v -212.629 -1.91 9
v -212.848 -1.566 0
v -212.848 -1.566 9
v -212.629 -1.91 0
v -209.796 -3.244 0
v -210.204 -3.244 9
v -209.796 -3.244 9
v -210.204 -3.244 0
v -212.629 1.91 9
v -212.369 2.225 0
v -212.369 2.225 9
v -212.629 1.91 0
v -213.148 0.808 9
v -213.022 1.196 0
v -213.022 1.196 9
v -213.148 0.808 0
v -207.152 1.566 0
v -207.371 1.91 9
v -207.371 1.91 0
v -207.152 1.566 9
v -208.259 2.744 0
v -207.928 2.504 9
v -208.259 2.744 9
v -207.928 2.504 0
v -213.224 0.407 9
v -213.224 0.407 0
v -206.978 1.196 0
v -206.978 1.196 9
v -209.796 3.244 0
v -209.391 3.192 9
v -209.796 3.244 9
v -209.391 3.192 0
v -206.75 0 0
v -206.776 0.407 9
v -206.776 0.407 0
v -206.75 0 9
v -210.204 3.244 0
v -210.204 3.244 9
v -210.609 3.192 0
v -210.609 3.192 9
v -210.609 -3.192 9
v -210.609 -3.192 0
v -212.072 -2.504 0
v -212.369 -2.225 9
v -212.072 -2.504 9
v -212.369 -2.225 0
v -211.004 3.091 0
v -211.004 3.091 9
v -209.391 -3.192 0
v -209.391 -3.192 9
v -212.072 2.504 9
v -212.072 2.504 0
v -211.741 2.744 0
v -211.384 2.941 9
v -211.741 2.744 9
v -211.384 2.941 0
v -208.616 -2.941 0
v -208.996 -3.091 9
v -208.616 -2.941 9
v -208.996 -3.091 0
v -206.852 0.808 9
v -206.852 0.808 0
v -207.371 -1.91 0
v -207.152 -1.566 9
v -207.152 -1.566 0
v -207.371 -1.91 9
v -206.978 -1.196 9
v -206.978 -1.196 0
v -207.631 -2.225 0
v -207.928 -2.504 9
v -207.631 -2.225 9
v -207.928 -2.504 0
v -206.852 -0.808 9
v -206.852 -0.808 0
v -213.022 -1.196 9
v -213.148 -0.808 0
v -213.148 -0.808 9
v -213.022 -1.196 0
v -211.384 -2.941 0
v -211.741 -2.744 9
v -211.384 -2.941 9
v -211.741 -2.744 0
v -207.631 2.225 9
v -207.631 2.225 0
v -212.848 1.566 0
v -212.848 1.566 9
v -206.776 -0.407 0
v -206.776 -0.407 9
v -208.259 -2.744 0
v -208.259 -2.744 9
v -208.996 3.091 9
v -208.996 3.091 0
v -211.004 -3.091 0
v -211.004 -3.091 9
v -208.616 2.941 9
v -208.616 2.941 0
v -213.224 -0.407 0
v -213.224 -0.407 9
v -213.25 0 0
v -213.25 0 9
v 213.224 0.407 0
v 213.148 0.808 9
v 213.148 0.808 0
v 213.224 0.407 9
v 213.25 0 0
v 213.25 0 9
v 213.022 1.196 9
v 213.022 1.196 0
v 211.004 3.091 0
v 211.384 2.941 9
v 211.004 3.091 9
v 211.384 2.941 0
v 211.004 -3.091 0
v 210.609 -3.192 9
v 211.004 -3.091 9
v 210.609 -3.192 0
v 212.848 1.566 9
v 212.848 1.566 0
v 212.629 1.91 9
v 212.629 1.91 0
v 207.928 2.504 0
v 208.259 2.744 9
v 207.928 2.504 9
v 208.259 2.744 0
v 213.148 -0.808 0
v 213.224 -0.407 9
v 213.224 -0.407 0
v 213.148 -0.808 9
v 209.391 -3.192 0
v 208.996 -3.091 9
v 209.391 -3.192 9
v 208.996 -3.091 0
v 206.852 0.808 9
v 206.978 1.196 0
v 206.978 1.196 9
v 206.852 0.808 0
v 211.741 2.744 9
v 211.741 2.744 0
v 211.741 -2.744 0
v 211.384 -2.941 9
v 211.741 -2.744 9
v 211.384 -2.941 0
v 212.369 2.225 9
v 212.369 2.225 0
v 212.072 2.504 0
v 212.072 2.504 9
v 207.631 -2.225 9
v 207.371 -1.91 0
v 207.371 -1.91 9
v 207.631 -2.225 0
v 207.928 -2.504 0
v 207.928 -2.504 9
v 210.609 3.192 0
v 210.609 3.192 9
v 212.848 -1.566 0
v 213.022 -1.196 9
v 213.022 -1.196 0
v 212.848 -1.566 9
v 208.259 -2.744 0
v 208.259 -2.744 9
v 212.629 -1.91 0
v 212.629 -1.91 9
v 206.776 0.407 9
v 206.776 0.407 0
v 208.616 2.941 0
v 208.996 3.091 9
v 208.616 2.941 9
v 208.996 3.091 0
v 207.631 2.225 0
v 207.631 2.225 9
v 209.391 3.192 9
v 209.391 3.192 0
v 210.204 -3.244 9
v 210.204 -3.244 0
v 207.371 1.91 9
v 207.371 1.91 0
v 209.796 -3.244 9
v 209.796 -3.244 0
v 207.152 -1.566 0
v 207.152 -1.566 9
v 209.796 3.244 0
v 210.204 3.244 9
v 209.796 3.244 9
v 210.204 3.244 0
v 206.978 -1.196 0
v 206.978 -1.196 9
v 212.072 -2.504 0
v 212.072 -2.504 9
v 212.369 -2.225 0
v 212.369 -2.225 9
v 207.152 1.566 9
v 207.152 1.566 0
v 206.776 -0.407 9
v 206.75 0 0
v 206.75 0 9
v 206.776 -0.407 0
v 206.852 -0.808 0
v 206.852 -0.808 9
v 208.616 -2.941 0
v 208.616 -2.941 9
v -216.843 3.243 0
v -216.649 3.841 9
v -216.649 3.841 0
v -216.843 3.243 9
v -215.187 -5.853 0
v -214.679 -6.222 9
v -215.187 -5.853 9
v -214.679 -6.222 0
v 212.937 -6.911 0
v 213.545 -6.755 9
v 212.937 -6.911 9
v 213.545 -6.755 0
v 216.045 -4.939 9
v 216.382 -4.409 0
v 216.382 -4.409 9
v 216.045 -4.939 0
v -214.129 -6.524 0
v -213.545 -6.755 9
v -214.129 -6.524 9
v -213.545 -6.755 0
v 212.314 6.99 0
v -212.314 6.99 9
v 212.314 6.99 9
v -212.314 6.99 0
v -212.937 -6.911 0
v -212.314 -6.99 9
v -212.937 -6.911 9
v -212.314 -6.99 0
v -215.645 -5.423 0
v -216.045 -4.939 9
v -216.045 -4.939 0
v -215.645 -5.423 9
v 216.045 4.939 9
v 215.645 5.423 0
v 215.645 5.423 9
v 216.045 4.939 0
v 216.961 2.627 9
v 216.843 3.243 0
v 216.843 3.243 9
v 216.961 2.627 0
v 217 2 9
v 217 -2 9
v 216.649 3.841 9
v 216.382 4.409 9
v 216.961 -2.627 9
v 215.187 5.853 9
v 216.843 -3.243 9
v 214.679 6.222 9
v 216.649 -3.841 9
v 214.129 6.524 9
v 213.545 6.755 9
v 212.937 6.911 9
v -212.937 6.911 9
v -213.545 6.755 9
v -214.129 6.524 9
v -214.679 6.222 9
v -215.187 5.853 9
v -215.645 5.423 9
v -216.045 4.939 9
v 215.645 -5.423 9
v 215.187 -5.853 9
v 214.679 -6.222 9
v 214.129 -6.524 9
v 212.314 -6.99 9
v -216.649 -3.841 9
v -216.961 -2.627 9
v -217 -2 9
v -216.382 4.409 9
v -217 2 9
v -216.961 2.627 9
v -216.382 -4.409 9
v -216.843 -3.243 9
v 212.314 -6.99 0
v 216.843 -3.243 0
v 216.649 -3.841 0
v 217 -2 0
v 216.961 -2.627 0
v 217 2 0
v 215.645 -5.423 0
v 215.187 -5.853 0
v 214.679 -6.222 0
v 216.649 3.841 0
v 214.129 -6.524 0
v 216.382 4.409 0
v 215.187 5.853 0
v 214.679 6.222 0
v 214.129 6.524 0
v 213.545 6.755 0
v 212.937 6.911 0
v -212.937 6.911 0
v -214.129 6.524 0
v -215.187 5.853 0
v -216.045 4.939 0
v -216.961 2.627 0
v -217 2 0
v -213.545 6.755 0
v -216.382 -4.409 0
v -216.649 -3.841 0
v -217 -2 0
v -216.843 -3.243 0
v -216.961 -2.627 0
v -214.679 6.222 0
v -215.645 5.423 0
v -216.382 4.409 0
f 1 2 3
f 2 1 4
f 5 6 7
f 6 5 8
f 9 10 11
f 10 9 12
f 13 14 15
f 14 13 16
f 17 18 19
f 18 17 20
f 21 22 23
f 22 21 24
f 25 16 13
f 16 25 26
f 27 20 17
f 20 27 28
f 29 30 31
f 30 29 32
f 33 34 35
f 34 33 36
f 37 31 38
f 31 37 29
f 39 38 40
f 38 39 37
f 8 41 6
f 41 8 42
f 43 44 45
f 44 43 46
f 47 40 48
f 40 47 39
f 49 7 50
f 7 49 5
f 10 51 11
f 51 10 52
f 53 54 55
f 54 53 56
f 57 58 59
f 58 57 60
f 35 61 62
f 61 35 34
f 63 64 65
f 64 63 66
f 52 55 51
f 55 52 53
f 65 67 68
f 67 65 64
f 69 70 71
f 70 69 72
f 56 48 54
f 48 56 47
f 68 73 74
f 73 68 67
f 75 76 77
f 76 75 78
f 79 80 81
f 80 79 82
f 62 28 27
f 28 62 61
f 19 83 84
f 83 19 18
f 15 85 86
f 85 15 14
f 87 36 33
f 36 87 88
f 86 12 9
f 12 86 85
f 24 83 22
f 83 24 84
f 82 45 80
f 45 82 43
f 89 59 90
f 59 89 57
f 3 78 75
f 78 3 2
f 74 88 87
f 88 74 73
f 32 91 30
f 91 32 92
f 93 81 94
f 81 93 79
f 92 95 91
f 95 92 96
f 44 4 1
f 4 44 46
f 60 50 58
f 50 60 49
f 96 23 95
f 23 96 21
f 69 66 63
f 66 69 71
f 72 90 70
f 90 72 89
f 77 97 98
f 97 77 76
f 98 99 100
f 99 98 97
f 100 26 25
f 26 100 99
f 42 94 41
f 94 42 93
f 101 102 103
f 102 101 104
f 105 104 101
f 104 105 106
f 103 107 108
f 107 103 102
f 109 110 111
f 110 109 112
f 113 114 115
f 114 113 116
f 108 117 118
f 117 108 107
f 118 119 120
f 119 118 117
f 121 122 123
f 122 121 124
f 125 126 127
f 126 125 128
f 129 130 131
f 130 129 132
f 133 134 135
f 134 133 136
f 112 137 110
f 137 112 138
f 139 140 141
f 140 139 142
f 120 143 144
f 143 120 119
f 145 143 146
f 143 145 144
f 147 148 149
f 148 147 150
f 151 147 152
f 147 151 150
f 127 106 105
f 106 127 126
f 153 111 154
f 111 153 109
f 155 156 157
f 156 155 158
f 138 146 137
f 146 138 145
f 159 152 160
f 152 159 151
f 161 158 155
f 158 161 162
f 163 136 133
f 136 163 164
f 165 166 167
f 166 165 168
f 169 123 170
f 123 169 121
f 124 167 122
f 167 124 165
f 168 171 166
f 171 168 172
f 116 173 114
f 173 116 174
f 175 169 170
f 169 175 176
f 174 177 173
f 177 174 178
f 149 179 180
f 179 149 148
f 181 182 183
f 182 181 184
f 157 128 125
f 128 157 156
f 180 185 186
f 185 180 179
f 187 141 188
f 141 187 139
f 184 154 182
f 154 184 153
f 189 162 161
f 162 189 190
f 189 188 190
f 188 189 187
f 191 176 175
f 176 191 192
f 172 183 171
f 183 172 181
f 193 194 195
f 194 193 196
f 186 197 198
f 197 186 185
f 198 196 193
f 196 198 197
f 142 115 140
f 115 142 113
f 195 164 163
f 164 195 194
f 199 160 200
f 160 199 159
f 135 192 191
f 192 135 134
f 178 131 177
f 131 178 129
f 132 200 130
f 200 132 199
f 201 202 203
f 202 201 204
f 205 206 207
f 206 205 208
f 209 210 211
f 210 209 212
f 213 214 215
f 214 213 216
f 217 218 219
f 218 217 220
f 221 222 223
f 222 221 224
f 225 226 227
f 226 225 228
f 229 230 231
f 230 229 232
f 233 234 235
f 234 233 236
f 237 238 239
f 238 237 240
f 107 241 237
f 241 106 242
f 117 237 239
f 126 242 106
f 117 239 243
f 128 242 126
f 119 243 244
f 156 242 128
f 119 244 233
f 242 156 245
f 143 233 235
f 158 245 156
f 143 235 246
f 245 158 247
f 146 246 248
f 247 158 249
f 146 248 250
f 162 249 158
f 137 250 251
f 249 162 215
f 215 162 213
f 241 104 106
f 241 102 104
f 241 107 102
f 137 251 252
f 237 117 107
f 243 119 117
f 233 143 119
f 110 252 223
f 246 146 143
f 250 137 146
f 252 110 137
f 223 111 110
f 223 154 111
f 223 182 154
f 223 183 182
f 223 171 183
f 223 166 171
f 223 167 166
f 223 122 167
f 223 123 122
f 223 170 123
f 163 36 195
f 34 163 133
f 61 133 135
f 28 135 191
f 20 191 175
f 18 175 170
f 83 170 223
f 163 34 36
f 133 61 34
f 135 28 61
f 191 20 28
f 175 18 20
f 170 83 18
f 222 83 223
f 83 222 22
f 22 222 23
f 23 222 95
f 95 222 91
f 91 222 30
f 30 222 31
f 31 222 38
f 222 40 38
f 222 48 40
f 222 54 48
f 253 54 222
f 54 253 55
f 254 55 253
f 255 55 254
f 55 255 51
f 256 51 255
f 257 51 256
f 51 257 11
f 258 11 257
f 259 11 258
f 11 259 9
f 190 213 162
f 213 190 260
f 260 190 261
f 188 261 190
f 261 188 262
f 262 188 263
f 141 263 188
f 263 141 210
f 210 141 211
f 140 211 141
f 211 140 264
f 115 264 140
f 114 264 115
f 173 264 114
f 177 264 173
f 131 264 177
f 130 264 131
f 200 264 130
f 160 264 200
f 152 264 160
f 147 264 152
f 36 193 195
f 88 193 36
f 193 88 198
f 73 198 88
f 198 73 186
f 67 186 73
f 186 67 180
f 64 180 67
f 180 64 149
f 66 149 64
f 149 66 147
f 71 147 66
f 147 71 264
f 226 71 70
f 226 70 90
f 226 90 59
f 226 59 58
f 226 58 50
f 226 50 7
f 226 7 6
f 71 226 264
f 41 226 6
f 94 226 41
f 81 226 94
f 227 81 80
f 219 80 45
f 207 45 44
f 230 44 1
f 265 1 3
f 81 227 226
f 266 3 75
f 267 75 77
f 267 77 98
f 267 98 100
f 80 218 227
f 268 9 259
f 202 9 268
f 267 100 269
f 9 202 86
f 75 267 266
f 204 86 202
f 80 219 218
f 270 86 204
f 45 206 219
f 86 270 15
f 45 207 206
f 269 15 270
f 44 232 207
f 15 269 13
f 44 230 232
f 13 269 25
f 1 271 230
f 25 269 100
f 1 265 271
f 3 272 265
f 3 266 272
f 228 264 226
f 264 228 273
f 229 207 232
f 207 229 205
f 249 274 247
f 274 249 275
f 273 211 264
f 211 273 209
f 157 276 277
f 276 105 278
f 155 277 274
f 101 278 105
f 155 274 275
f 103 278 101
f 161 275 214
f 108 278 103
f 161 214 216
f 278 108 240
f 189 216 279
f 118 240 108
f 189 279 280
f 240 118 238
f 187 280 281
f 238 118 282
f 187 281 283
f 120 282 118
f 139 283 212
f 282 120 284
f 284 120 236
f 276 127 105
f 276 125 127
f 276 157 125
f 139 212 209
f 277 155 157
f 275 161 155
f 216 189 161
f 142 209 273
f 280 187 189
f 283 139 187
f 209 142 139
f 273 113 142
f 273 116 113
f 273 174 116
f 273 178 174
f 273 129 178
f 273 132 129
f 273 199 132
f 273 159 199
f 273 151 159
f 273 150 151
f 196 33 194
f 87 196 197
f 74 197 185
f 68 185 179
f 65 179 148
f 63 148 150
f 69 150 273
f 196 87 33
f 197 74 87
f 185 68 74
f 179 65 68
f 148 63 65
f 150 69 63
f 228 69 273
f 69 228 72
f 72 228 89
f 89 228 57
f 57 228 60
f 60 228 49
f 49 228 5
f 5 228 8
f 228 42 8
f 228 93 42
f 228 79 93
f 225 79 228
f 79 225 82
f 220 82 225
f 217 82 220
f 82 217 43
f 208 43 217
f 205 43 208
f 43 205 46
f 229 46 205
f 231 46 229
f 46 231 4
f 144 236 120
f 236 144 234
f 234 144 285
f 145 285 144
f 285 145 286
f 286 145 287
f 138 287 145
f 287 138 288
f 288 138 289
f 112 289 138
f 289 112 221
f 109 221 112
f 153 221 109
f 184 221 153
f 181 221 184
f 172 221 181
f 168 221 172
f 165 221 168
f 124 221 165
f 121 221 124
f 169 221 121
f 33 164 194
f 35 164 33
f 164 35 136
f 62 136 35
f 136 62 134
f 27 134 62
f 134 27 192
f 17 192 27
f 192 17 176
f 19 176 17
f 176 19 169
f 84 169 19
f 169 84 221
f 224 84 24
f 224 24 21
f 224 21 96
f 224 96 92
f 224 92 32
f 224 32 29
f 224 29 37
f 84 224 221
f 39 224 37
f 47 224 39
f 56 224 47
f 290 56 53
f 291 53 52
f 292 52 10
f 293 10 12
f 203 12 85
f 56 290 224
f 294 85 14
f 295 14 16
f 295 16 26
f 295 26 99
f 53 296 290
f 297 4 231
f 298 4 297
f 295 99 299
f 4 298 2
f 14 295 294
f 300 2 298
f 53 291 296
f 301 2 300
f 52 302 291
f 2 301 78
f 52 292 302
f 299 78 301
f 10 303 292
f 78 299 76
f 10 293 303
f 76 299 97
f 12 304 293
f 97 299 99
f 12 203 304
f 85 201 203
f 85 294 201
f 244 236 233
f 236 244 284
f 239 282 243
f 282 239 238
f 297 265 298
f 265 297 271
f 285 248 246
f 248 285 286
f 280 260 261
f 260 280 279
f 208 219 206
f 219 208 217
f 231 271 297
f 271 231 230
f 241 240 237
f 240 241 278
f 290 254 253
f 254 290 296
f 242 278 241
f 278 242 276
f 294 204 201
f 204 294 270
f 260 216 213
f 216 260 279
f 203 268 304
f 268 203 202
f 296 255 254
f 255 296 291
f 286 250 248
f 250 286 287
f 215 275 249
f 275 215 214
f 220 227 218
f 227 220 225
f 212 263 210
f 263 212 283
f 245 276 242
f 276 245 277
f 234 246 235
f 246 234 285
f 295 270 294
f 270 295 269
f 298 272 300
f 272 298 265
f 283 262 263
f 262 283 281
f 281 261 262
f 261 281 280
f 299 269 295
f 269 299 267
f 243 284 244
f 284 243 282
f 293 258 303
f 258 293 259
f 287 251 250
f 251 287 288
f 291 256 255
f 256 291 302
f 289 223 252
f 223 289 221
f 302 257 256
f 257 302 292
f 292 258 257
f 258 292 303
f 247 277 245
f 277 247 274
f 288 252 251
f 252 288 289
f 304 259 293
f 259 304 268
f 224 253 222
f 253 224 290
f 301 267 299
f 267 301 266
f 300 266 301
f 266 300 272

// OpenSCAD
$fn = 50;


difference() {
	union() {
		hull() {
			translate(v = [-212.0000000000, 2.0000000000, 0]) {
				cylinder(h = 9, r = 5);
			}
			translate(v = [212.0000000000, 2.0000000000, 0]) {
				cylinder(h = 9, r = 5);
			}
			translate(v = [-212.0000000000, -2.0000000000, 0]) {
				cylinder(h = 9, r = 5);
			}
			translate(v = [212.0000000000, -2.0000000000, 0]) {
				cylinder(h = 9, r = 5);
			}
		}
	}
	union() {
		translate(v = [-210.0000000000, 0.0000000000, -100.0000000000]) {
			cylinder(h = 200, r = 3.2500000000);
		}
		translate(v = [-210.0000000000, 0.0000000000, -100.0000000000]) {
			cylinder(h = 200, r = 3.2500000000);
		}
		translate(v = [210.0000000000, 0.0000000000, -100.0000000000]) {
			cylinder(h = 200, r = 3.2500000000);
		}
		translate(v = [210.0000000000, 0.0000000000, -100.0000000000]) {
			cylinder(h = 200, r = 3.2500000000);
		}
	}
}
